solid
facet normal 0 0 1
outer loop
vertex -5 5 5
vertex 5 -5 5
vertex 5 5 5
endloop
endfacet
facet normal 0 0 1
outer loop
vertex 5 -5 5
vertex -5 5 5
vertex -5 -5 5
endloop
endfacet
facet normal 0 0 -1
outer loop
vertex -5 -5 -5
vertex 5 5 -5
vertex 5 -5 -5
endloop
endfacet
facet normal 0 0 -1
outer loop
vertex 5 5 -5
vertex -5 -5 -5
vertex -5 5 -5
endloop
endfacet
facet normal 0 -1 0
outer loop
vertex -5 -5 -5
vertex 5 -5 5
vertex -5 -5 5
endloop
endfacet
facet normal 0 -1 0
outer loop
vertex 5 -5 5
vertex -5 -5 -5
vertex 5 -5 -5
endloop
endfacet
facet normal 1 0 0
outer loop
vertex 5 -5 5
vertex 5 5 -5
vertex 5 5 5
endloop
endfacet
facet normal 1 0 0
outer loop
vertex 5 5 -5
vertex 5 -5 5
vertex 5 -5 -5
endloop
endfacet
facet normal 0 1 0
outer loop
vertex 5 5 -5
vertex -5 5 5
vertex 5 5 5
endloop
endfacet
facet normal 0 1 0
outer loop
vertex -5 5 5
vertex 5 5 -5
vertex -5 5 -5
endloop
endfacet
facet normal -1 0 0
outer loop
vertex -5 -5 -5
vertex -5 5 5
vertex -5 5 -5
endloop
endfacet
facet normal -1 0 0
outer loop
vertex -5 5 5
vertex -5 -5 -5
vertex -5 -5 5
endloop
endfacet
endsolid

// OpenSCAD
// Smallest valid model — proves the toolchain renders to a manifold STL.
assert(1 + 1 == 2, "sanity");
cube([10, 10, 10], center = true);
